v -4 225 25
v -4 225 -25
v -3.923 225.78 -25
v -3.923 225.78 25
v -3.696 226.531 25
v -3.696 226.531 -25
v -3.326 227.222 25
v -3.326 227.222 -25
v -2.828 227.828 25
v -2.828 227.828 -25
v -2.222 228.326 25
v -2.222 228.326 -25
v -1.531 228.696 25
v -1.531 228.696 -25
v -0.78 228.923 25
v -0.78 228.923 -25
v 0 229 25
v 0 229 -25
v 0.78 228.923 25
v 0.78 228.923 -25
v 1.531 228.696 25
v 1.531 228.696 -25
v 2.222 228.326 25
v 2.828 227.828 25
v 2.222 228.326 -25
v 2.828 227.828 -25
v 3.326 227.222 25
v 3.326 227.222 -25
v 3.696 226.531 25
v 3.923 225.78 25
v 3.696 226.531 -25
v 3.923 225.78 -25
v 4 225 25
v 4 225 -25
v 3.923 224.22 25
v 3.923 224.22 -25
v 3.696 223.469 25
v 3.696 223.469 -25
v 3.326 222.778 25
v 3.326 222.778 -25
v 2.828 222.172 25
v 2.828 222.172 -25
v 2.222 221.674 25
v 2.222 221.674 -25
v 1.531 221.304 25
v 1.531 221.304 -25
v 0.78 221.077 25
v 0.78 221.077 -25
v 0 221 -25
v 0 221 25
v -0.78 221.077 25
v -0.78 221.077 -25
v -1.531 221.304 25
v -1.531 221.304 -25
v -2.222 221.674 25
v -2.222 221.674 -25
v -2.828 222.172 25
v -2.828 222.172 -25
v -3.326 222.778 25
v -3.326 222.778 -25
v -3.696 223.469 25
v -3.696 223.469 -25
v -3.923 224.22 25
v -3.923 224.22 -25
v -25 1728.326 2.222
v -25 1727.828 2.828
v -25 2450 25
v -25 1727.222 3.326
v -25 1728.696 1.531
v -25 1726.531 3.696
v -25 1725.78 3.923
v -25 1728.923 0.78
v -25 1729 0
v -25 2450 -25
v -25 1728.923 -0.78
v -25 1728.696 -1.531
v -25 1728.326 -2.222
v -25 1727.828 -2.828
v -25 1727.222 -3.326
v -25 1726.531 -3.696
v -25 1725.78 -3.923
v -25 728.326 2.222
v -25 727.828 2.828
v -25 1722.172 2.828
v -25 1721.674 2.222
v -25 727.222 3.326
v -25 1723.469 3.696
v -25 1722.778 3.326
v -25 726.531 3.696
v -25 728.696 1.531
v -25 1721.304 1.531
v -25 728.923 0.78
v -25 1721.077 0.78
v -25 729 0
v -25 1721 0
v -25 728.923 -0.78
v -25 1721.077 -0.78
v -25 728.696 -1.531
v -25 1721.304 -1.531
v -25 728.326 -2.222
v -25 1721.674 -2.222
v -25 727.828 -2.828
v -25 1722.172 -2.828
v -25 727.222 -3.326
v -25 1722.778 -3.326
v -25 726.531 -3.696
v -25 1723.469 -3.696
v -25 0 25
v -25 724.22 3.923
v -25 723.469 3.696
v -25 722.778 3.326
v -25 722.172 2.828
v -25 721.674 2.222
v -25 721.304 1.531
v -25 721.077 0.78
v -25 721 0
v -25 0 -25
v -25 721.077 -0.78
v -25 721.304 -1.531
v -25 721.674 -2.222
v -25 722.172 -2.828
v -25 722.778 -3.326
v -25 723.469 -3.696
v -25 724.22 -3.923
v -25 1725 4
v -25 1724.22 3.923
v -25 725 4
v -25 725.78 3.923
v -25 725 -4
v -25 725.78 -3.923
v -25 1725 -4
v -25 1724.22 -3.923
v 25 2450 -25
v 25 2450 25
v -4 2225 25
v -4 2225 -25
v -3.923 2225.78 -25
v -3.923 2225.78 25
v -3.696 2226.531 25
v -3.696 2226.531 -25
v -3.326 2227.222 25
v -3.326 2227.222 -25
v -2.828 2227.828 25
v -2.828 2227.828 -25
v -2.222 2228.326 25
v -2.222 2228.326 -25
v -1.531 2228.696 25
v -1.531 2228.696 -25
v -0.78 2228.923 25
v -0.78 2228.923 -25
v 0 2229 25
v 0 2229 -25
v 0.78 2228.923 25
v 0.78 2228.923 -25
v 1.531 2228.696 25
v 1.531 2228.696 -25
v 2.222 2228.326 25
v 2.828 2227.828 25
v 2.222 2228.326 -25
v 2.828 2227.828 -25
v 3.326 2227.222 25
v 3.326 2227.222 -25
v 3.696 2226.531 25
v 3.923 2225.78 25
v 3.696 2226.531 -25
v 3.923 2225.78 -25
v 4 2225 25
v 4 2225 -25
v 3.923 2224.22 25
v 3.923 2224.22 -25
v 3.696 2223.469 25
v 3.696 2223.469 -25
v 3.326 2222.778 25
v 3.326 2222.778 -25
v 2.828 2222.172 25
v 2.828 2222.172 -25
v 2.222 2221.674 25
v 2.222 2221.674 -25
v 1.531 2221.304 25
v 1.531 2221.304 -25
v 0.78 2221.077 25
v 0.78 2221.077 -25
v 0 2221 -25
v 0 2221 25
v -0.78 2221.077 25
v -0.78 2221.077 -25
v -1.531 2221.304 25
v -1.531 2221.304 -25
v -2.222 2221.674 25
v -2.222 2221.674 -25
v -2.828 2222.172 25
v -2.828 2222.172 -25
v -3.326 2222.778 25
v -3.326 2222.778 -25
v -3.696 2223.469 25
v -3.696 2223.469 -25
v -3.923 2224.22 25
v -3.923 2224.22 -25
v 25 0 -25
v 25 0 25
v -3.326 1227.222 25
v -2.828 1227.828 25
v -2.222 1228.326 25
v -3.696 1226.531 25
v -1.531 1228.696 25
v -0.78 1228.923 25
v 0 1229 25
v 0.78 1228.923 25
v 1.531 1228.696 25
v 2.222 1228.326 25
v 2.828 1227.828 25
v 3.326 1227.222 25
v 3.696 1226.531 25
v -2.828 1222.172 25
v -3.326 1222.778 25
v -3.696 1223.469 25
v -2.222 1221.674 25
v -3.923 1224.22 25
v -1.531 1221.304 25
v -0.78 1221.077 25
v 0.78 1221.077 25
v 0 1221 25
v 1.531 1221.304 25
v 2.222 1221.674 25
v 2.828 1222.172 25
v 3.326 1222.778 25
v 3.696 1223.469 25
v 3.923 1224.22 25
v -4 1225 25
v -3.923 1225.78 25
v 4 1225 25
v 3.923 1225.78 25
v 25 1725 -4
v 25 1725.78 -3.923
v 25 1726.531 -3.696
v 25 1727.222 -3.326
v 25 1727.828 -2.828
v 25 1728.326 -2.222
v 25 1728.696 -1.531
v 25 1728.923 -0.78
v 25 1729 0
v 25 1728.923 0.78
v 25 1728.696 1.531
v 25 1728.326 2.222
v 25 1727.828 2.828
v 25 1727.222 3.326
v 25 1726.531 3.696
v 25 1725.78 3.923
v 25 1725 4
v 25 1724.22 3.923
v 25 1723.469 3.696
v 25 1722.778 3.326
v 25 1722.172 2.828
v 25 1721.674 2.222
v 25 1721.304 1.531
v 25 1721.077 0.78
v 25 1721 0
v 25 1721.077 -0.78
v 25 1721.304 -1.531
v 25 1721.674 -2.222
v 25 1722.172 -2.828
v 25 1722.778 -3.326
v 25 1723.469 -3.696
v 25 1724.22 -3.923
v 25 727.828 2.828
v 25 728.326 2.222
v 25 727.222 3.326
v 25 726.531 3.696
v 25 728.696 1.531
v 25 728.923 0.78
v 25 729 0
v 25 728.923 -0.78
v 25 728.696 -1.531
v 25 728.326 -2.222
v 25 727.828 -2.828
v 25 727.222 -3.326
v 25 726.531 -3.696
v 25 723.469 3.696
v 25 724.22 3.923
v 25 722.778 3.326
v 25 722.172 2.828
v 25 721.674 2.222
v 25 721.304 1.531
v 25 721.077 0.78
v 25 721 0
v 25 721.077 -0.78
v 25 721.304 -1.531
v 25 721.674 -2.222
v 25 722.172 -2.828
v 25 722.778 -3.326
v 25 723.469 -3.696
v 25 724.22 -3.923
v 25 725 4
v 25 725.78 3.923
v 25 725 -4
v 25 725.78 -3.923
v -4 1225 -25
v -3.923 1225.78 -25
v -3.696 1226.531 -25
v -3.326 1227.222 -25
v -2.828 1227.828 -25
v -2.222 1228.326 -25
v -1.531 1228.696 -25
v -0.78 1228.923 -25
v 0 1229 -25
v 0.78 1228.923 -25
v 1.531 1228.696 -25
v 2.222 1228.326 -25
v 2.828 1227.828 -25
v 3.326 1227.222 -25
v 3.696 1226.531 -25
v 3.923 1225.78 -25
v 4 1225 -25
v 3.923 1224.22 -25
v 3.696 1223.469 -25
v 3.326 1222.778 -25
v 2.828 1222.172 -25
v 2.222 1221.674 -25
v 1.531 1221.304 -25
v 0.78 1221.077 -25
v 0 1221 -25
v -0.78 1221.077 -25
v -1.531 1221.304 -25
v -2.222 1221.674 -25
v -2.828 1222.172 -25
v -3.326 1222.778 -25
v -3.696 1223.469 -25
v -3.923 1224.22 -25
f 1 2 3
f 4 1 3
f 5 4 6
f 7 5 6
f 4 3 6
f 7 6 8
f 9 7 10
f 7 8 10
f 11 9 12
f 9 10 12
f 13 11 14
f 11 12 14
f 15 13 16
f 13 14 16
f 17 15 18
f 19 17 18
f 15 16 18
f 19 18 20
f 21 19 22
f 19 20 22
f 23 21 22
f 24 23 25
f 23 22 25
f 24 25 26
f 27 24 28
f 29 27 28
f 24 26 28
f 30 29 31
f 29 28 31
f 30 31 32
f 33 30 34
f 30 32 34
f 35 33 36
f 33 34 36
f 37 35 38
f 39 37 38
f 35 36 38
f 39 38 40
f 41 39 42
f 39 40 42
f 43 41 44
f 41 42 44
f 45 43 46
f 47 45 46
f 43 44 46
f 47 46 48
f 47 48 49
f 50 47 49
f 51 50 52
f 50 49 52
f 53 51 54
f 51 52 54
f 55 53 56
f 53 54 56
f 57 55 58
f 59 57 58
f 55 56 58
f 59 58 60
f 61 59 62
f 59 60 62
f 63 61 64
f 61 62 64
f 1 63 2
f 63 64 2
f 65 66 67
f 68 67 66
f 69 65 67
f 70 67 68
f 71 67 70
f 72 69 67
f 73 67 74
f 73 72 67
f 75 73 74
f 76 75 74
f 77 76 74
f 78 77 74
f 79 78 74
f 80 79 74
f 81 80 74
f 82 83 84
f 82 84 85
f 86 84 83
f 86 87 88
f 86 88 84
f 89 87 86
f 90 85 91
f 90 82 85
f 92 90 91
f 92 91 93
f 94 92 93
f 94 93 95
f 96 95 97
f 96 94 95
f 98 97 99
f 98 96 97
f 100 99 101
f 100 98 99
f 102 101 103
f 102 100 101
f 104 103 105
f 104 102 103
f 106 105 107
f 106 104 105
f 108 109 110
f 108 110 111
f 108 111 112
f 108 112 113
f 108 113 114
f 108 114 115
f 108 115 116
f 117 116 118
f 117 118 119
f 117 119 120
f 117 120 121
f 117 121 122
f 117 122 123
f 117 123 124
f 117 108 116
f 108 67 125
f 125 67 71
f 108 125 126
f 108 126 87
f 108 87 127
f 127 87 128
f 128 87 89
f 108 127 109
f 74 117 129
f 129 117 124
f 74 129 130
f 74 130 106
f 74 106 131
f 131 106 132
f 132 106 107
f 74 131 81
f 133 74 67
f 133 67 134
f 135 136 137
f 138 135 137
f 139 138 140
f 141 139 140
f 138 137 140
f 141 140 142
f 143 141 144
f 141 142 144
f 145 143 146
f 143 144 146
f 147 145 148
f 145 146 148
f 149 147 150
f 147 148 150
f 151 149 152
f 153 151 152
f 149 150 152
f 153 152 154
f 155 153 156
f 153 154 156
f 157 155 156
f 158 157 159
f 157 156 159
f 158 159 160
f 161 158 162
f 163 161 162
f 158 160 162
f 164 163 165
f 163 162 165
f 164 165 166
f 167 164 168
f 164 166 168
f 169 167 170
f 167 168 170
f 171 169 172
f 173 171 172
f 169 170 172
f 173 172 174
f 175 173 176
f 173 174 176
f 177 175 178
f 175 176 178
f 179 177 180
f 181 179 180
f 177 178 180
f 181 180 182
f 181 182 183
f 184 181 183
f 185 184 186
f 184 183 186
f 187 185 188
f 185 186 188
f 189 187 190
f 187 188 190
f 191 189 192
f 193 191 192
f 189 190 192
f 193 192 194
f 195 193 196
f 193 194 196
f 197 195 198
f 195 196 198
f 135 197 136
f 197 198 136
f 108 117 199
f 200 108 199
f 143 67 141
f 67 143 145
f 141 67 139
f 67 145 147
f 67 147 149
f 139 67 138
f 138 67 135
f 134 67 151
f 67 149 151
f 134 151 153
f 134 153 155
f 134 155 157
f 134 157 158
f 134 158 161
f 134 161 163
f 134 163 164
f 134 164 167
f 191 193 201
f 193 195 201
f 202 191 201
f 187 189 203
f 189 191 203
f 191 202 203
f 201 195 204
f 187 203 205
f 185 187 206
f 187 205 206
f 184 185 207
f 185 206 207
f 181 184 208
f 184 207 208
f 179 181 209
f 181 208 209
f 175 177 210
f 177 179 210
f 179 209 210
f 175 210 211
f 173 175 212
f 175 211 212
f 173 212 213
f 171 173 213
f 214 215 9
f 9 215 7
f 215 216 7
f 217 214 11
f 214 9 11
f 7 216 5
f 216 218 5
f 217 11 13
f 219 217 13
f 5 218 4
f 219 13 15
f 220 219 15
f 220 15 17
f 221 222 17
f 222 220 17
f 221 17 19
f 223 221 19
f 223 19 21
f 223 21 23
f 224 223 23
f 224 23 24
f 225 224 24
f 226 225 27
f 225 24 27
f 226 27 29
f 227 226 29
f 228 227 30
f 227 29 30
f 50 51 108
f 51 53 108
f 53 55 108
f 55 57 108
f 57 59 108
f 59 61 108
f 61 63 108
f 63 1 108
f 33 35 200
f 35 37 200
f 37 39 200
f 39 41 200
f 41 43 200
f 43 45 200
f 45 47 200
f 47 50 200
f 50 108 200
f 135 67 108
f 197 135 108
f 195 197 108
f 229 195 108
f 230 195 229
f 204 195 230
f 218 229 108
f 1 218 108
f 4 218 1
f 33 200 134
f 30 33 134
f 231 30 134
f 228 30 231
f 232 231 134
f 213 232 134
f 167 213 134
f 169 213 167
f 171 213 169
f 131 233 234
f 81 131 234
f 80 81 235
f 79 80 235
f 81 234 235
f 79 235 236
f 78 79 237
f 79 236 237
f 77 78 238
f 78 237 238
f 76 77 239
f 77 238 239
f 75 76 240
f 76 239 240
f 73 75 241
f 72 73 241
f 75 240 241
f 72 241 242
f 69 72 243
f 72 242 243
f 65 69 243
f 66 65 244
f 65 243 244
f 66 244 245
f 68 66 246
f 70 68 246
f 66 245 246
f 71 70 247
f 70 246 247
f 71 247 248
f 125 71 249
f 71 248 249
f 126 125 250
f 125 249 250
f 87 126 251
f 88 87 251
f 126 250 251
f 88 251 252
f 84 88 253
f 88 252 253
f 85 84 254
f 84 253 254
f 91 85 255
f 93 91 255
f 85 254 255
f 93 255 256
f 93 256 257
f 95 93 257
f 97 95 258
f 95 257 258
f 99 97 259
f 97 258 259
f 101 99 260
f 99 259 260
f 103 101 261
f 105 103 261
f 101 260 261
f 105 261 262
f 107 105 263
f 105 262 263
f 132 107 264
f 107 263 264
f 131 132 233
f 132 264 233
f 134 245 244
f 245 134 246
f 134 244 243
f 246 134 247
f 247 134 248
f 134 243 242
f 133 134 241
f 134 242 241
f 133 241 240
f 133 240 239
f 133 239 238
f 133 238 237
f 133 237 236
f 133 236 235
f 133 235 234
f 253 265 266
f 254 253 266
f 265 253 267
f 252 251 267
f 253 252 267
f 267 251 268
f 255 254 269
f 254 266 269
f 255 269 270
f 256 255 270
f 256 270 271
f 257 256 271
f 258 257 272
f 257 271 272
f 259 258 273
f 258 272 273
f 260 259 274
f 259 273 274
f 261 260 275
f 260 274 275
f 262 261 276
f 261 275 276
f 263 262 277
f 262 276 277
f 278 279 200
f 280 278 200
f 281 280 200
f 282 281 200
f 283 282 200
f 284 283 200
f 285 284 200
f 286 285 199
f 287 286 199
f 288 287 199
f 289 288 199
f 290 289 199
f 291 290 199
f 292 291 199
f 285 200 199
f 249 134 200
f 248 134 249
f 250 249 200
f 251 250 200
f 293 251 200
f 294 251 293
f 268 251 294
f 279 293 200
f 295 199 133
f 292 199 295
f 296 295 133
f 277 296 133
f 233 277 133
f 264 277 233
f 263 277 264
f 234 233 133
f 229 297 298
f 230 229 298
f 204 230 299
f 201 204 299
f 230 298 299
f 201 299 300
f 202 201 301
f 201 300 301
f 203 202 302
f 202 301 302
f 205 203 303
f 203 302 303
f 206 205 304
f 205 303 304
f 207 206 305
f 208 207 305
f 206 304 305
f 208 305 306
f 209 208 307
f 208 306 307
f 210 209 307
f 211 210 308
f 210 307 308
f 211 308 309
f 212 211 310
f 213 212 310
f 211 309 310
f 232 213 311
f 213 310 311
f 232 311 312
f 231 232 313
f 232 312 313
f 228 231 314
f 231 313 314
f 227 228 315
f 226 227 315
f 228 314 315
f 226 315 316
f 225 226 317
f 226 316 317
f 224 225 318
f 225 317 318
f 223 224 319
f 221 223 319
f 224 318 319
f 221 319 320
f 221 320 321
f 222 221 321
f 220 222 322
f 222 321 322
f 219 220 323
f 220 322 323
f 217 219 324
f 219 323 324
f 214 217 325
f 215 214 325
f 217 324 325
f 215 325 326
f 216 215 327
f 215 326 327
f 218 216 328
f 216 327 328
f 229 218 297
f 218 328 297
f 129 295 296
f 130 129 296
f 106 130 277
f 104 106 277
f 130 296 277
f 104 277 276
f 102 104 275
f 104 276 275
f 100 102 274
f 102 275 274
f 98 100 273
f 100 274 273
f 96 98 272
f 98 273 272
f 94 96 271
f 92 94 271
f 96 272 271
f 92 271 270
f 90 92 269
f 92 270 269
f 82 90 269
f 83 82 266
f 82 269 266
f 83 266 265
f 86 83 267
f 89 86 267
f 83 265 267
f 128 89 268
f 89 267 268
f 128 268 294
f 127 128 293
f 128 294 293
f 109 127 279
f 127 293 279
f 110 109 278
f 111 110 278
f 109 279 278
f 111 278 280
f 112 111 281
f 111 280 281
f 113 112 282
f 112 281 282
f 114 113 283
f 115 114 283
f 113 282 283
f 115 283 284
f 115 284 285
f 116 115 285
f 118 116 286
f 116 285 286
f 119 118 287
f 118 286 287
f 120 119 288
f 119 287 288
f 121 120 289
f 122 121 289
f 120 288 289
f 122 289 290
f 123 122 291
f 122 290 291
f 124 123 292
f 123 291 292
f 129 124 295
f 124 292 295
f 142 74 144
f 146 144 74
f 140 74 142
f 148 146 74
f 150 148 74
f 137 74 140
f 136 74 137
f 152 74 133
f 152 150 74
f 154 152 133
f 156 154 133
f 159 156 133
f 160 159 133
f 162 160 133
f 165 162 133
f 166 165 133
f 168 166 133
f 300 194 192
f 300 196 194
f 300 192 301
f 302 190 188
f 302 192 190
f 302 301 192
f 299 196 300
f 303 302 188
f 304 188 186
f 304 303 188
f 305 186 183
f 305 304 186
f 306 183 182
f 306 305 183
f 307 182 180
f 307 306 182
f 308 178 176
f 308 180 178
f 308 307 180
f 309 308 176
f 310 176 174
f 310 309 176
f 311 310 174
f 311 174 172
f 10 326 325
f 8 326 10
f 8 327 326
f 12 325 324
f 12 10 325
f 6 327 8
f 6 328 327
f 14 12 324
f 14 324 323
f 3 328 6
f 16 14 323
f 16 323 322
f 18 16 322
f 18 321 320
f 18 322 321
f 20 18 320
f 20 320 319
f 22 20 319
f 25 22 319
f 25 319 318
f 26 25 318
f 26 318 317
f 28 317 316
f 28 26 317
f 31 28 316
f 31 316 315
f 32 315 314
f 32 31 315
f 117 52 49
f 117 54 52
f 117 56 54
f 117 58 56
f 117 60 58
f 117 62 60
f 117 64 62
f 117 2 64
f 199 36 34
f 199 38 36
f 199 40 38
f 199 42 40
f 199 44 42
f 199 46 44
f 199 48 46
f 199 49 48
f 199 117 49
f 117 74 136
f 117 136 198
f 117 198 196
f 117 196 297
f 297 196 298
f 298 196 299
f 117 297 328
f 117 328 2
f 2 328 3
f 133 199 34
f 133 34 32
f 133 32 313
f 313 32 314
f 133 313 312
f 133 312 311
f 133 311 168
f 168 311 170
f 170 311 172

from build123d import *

# Parameters (mm, degrees)
SKETCH_1_W          = 50
SKETCH_1_H          = 50
EXTRUDE_1_DEPTH     = 2450
SKETCH_10_R         = 4
CUT_EXTRUDE_8_DEPTH = 50
SKETCH_11_R         = 4
CUT_EXTRUDE_9_DEPTH = 50


with BuildPart() as part:
    # Эскиз1 → Бобышка-Вытянуть1 (new body)
    with BuildSketch(Plane(origin=(0, 0, 0), x_dir=(1, 0, 0), z_dir=(0, 1, 0))):
        Rectangle(SKETCH_1_W, SKETCH_1_H)
    extrude(amount=EXTRUDE_1_DEPTH)

    # Эскиз10 → Вырез-Вытянуть8 (cut)
    with BuildSketch(Plane(origin=(0, 0, -25), x_dir=(-1, 0, 0), z_dir=(0, 0, -1))):
        with Locations((0, 1225)):
            Circle(SKETCH_10_R)
        with Locations((0, 2225)):
            Circle(SKETCH_10_R)
        with Locations((0, 225)):
            Circle(SKETCH_10_R)
    extrude(amount=-CUT_EXTRUDE_8_DEPTH, mode=Mode.SUBTRACT)

    # Эскиз11 → Вырез-Вытянуть9 (cut)
    with BuildSketch(Plane(origin=(25, 0, 0), x_dir=(0, 0, -1), z_dir=(1, 0, 0))):
        with Locations((0, 1725)):
            Circle(SKETCH_11_R)
        with Locations((0, 725)):
            Circle(SKETCH_11_R)
    extrude(amount=-CUT_EXTRUDE_9_DEPTH, mode=Mode.SUBTRACT)


solid = part.part
